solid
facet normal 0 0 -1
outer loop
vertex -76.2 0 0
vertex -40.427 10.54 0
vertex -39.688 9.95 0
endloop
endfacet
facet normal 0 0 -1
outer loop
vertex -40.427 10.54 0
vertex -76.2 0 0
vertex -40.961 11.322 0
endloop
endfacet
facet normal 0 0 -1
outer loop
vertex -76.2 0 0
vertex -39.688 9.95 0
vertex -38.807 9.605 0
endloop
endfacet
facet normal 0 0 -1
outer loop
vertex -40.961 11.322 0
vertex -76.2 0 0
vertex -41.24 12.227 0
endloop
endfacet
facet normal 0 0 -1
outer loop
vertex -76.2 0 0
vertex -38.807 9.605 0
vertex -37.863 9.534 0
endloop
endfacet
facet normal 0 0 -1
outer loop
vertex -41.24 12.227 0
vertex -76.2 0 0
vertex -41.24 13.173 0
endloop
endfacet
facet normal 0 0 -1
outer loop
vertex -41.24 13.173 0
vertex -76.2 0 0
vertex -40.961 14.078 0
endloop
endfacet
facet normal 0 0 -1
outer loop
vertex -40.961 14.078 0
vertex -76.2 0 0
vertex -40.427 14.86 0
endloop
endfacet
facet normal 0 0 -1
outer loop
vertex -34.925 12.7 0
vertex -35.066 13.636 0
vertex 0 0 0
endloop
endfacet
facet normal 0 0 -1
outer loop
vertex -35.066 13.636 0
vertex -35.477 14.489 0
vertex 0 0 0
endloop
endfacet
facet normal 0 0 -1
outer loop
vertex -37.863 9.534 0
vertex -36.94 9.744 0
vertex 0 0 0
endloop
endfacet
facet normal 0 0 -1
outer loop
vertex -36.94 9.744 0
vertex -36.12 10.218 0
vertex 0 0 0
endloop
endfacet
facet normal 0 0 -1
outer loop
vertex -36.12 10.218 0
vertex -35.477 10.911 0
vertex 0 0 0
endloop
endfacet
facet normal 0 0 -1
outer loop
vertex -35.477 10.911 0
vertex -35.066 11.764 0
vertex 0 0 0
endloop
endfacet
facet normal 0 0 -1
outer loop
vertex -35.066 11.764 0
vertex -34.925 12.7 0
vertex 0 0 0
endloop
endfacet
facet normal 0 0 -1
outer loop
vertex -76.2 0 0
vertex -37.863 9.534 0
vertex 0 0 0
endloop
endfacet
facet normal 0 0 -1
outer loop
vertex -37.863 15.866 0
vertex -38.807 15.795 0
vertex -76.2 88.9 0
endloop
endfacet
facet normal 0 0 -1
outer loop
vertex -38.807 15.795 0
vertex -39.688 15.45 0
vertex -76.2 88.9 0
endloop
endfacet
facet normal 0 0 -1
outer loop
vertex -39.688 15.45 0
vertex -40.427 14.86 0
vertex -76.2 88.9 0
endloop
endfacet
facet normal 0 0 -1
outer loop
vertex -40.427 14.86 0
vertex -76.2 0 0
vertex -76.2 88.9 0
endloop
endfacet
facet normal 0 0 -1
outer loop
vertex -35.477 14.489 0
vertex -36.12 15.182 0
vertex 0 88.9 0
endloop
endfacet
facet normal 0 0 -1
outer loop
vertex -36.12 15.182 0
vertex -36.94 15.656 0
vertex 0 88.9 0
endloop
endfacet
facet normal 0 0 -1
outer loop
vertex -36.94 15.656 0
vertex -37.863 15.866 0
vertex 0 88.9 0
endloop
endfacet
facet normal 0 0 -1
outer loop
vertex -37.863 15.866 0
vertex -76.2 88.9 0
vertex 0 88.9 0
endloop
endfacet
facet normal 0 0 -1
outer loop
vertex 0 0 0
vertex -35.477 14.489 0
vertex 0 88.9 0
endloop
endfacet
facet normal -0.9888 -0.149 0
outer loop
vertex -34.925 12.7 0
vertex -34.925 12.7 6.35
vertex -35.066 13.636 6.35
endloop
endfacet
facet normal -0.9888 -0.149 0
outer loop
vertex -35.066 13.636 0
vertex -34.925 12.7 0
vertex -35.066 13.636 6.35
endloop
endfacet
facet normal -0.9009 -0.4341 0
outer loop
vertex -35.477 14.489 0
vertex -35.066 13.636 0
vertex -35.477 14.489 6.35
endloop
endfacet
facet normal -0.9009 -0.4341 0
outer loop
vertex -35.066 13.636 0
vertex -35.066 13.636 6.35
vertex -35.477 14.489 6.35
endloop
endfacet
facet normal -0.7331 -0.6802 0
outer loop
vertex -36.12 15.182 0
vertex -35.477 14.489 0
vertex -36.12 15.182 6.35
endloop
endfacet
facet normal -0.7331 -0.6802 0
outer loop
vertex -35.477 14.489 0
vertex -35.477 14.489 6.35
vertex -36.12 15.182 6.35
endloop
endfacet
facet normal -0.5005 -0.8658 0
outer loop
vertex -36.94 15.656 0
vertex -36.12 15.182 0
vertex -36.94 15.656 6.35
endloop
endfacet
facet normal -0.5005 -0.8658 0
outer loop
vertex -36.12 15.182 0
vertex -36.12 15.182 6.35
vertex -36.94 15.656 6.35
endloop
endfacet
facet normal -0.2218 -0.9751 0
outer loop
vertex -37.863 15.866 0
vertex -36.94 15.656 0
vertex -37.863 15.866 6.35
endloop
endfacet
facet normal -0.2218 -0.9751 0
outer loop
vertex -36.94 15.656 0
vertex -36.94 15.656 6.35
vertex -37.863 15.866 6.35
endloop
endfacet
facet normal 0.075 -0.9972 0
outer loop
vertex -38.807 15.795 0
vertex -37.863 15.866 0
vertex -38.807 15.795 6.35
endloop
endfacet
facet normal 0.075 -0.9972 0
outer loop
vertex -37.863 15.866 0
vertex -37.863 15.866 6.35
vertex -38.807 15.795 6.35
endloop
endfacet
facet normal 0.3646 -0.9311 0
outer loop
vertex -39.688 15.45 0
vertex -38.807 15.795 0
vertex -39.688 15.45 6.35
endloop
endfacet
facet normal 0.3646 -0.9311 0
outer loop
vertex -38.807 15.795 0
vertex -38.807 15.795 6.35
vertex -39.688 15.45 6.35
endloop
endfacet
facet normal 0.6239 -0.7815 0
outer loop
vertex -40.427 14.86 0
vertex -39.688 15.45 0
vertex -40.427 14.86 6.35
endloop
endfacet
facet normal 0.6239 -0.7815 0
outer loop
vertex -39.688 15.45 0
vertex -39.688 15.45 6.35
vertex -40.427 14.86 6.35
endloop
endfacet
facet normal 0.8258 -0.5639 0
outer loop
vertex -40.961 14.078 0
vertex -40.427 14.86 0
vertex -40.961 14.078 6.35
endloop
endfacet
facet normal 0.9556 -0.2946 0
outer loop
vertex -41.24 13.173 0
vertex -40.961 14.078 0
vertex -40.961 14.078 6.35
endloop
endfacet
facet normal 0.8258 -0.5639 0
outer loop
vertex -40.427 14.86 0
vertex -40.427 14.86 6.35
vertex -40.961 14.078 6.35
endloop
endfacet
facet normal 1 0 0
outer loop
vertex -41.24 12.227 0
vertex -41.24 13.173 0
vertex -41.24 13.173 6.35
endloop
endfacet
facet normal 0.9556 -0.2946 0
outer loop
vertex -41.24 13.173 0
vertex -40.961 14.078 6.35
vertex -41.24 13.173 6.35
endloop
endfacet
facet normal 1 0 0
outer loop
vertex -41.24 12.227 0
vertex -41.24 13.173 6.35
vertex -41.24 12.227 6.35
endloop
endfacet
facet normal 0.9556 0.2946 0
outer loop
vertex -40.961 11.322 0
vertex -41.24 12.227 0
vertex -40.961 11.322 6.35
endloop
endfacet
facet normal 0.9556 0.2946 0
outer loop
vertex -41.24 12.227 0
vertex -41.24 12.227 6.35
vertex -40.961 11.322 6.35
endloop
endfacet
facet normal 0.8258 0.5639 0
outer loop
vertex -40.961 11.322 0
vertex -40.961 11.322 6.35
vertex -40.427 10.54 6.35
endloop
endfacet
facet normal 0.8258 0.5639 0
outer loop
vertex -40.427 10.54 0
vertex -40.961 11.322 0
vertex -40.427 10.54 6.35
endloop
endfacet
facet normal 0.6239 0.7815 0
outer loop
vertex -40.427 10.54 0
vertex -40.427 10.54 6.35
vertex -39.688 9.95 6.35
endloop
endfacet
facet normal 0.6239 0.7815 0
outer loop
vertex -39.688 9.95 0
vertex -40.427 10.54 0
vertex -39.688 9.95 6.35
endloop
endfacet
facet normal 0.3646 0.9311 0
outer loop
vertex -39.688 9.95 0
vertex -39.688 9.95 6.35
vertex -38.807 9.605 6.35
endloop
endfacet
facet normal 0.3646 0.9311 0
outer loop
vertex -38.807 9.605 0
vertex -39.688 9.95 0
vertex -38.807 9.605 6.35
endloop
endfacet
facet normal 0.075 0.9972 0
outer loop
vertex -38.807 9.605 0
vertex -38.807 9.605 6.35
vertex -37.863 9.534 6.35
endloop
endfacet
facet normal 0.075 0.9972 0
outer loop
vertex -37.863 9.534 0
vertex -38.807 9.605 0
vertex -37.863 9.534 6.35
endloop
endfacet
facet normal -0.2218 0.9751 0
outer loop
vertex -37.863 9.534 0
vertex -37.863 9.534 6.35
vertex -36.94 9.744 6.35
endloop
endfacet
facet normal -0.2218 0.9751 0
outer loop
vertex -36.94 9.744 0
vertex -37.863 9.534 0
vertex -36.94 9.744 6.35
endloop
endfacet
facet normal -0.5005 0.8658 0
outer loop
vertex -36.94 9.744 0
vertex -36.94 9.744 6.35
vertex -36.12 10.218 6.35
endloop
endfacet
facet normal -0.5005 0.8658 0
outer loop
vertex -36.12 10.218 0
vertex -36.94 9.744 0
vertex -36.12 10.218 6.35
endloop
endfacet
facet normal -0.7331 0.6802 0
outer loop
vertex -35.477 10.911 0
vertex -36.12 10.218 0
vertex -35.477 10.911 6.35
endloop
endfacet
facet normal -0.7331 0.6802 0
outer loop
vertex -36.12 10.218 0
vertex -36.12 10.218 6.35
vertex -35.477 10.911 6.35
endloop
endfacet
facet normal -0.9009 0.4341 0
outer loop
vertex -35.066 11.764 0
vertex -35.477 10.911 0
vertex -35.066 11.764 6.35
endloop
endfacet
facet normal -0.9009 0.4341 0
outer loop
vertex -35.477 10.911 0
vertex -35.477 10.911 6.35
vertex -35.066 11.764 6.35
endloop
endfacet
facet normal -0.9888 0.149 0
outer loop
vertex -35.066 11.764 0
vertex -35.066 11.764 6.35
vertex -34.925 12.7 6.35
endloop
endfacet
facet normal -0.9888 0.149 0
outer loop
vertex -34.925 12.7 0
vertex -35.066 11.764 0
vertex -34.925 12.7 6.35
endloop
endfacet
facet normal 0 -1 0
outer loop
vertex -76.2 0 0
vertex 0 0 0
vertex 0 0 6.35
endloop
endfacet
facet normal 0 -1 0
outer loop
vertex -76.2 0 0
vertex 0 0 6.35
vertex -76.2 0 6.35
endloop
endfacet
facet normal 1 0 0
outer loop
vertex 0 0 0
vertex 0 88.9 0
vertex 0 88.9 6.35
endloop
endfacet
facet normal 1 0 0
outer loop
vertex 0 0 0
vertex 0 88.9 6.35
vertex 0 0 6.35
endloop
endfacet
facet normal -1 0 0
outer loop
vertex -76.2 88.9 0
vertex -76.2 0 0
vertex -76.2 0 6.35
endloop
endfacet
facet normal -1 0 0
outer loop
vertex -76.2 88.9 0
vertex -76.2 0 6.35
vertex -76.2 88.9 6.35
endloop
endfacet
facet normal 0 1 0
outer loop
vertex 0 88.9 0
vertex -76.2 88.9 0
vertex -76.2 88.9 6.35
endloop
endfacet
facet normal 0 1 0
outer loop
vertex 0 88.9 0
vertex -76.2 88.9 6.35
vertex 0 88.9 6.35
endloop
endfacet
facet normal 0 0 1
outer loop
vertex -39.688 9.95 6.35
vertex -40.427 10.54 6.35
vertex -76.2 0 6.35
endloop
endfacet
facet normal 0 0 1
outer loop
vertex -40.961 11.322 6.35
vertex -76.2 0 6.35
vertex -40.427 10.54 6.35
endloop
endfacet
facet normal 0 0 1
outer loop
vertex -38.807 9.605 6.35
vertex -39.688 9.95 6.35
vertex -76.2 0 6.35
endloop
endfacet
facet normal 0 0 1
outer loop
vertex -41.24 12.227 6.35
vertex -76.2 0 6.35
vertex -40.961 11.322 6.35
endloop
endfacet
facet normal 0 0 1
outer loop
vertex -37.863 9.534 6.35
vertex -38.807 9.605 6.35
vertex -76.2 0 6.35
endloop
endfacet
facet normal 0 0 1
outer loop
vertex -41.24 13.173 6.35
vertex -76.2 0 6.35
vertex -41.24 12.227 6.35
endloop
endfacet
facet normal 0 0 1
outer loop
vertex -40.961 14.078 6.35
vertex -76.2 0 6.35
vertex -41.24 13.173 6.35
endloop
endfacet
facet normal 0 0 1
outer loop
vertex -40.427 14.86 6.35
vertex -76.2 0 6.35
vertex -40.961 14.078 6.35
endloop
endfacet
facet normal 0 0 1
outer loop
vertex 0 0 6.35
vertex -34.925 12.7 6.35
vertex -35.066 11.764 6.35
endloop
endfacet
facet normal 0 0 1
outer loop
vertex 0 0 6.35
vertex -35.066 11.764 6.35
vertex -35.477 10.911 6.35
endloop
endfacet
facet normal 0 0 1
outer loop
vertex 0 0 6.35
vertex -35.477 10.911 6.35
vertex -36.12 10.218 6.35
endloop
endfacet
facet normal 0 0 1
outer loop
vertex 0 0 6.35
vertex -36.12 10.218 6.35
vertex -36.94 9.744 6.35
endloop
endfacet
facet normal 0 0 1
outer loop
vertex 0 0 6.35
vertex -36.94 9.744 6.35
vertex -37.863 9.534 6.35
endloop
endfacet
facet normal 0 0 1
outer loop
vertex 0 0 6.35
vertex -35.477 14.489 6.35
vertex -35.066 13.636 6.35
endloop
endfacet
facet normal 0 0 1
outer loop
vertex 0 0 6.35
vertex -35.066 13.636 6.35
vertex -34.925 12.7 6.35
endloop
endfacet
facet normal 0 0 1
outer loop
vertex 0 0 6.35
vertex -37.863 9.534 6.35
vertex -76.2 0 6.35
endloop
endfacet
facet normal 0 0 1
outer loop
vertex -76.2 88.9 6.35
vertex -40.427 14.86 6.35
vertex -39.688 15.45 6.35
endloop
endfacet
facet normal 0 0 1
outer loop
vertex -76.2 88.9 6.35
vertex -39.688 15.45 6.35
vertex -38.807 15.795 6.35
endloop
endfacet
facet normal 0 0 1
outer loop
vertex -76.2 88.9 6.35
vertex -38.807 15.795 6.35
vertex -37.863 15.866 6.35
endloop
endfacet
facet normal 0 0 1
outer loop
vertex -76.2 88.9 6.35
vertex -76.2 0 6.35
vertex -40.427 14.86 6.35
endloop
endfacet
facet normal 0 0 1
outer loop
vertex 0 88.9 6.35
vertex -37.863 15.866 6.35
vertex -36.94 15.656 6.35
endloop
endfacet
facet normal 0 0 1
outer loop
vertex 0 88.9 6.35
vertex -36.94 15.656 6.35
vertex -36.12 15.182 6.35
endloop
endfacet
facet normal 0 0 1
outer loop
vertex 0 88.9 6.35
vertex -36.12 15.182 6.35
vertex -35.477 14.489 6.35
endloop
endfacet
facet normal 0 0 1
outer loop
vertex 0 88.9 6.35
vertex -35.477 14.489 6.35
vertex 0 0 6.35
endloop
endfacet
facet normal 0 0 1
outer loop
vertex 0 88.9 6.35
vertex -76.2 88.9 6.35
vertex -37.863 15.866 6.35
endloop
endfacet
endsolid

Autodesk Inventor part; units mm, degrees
ref_plane "YZ Plane" through (0, 0, 0) normal (1, 0, 0) x (0, 1, 0)
ref_plane "XZ Plane" through (0, 0, 0) normal (0, 1, 0) x (-1, 0, 0)
ref_plane "XY Plane" through (0, 0, 0) normal (0, 0, 1) x (1, 0, 0)
sketch "Sketch1" plane through (0, 0, 0) normal (0, 0, 1) x (1, 0, 0)
  line L0 (0, 0) -> (-76.2, 0)
  line L1 (-76.2, 0) -> (-76.2, 88.9)
  line L2 (-76.2, 88.9) -> (0, 88.9)
  line L3 (0, 88.9) -> (0, 0)
  dimension "d0" = 76.2
  dimension "d1" = 88.9
extrude "Extrusion1" add sketch "Sketch1" along normal blind 6.35
sketch "Sketch3" plane through (0, 0, 6.35) normal (0, 0, 1) x (1, 0, 0)
  line L0 (-76.2, 0) -> (0, 0) projected
  line L1 (-76.2, 88.9) -> (-76.2, 0) projected
  line L2 (-38.1, 0) -> (-38.1, 12.7)
  circle A0 centre (-38.1, 12.7) radius 3.175
  dimension "d4" = 12.7
  dimension "d5" = 6.35
extrude "Extrusion2" cut sketch "Sketch3" against normal blind 25.4
properties part number "hook mount plate" material "Aluminum 6061"
